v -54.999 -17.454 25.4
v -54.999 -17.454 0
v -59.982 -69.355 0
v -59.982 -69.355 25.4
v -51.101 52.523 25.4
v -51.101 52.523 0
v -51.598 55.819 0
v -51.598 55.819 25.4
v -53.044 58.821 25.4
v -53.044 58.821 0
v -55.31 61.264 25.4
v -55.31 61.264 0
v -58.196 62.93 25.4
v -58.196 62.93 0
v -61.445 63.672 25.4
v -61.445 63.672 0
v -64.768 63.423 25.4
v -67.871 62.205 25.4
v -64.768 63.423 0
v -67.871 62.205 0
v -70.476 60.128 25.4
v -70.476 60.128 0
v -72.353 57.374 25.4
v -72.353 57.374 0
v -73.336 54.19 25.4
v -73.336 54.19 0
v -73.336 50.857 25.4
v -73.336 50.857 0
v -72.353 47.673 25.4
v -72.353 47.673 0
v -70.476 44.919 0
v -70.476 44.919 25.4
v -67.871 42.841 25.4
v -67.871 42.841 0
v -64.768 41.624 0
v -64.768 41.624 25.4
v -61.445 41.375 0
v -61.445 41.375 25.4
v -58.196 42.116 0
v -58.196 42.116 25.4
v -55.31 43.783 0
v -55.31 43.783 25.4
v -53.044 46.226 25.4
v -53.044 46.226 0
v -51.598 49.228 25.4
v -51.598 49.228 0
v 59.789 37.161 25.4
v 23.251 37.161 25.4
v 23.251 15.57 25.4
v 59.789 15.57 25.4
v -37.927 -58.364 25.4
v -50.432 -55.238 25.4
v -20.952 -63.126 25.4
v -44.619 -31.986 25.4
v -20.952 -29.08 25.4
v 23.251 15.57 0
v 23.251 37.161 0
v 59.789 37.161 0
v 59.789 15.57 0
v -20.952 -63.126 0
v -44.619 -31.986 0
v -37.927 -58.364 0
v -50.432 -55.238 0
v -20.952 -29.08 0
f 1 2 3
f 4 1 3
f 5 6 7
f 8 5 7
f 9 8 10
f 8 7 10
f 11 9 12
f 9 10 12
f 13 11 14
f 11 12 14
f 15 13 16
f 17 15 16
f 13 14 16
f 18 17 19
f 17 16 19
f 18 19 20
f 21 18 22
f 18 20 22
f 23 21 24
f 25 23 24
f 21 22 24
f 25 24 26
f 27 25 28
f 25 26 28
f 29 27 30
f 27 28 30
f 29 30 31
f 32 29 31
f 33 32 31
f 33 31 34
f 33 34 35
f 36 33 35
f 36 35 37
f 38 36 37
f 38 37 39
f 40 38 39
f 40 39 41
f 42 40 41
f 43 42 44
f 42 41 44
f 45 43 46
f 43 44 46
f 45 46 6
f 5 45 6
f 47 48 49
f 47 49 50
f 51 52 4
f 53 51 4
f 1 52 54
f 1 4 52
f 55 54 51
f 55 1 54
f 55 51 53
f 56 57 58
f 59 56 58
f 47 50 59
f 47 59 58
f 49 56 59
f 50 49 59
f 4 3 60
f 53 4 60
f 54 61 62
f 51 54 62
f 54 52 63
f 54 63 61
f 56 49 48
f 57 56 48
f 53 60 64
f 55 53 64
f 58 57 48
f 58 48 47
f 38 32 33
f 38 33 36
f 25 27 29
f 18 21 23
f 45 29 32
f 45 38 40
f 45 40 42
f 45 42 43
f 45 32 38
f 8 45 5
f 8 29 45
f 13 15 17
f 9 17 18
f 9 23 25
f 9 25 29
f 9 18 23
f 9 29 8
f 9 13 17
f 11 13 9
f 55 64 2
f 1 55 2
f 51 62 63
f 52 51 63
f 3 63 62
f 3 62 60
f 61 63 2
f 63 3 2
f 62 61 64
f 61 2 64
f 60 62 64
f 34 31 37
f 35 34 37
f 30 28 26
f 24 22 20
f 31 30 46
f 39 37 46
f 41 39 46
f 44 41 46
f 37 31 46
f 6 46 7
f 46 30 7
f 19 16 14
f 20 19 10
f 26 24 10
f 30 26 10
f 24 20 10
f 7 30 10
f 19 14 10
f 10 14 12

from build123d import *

# Parameters (mm, degrees)
F1_DEPTH = 25.4
F0_R     = 11.179722
F2_DEPTH = 25.4
F0_W     = 36.537992
F0_H     = 21.590633
F3_DEPTH = 25.4


with BuildPart() as f1:
    # F0 (on Top) → F1 (new body)
    with BuildSketch(Plane.XY):
        Polygon((-20.952431, -29.079724), (-54.999199, -17.453996), (-59.981655, -69.354557), (-20.952431, -63.12649), align=None)
        Polygon((-50.431952, -55.237599), (-44.619087, -31.986151), (-37.92697, -58.363846), align=None, mode=Mode.SUBTRACT)
    extrude(amount=F1_DEPTH)


with BuildPart() as f2:
    # F0 (on Top) → F2 (new body)
    with BuildSketch(Plane.XY):
        with Locations((-62.280677, 52.52336)):
            Circle(F0_R)
    extrude(amount=F2_DEPTH)


with BuildPart() as f3:
    # F0 (on Top) → F3 (new body)
    with BuildSketch(Plane.XY):
        with Locations((41.520446, 26.365479)):
            Rectangle(F0_W, F0_H)
    extrude(amount=F3_DEPTH)


solid = Compound([f1.part, f2.part, f3.part])
